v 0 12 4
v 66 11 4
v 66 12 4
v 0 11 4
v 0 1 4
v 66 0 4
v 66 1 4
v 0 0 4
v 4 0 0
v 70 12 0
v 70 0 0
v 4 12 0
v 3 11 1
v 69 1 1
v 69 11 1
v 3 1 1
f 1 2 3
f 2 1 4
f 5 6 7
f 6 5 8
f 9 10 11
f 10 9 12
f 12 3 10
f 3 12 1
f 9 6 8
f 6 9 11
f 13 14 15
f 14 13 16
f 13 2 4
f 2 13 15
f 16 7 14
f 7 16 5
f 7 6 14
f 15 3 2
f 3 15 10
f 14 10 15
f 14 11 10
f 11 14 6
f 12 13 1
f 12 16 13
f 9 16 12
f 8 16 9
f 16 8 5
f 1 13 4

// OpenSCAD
// Outside width
u_breite=12; 
// Outside hight
u_hoehe= 4; 
// Length
u_laenge=70;
// Thickness of the wall
u_dicke=1; 

cut_top_left= "no"; // [yes,no]
cut_top_right= "yes"; // [yes,no]
cut_bottom_left= "yes"; // [yes,no]
cut_bottom_right= "no"; // [yes,no]

u_kanal(u_breite, u_hoehe, u_laenge, u_dicke, cut_top_left, cut_top_right, cut_bottom_left, cut_bottom_right);






//  module u_kanal(u_breite, u_hoehe, u_laenge)
//  allows to create cabel canals
//  u_breite outer width
//  u_hoehe outer hight
//  u_laenge length including cuttings
module u_kanal(u_breite=12, u_hoehe= 4, u_laenge=50, u_dicke=1, cut_top_left=false, cut_top_right=false, cut_bottom_left=false, cut_bottom_right=false){

    difference(){

       cube([ u_laenge, u_breite, u_hoehe]);
       translate([-u_dicke, u_dicke, u_dicke])
       cube([ u_laenge+2*u_dicke, u_breite-2*u_dicke, u_hoehe]);

        if(cut_top_left == "yes"){
             translate([0,-u_dicke,0])
            rotate([0,-45,0])
            cube(u_breite+u_hoehe);
        }
        if(cut_top_right == "yes"){
            translate([u_laenge,-u_dicke,0])
            rotate([0,-45,0])
            cube(u_breite+u_hoehe);
        }
        if(cut_bottom_left == "yes"){
            translate([0,-u_dicke,u_hoehe])
            rotate([0,135,0])
            cube(u_breite+u_hoehe);
        }
        if(cut_bottom_right == "yes"){
            translate([u_laenge,-u_dicke,u_hoehe])
            rotate([0,135,0])
            cube(u_breite+u_hoehe);
        }
    }

}
/*
//preview

width = 10;
height = 5;
length = 150;

translate([0,-3*width,0])
    u_kanal(width,height,length, cut_bottom_right=true);
translate([0,3*width,0])
    u_kanal(width,height,length, cut_bottom_left=true);
translate([0,0,0])
u_kanal(width,height,length);

//sample

translate([0,5*width,0]){
    //start bottom
    color("blue")
    translate([0,width, height])
    rotate([180,0,0])
    u_kanal(width,height,length/3, cut_bottom_right=true);

    //mid part
    color("lime")
    translate([length/3,width, 0])
    rotate([0,-90,180])
    u_kanal(width,height,length/3, cut_bottom_left=true, cut_bottom_right=true);

    //top part
    color("red")
    translate([0,0, length/3- height])
    rotate([0,0,0])
    u_kanal(width,height,length/3, cut_top_left=true, cut_bottom_right=true);

    //mid part
    color("yellow")
    translate([0,width, length/3])
    rotate([0,-90,180])
    u_kanal(width,height,length/3, cut_top_left=true, cut_bottom_right=true);

}
*/
